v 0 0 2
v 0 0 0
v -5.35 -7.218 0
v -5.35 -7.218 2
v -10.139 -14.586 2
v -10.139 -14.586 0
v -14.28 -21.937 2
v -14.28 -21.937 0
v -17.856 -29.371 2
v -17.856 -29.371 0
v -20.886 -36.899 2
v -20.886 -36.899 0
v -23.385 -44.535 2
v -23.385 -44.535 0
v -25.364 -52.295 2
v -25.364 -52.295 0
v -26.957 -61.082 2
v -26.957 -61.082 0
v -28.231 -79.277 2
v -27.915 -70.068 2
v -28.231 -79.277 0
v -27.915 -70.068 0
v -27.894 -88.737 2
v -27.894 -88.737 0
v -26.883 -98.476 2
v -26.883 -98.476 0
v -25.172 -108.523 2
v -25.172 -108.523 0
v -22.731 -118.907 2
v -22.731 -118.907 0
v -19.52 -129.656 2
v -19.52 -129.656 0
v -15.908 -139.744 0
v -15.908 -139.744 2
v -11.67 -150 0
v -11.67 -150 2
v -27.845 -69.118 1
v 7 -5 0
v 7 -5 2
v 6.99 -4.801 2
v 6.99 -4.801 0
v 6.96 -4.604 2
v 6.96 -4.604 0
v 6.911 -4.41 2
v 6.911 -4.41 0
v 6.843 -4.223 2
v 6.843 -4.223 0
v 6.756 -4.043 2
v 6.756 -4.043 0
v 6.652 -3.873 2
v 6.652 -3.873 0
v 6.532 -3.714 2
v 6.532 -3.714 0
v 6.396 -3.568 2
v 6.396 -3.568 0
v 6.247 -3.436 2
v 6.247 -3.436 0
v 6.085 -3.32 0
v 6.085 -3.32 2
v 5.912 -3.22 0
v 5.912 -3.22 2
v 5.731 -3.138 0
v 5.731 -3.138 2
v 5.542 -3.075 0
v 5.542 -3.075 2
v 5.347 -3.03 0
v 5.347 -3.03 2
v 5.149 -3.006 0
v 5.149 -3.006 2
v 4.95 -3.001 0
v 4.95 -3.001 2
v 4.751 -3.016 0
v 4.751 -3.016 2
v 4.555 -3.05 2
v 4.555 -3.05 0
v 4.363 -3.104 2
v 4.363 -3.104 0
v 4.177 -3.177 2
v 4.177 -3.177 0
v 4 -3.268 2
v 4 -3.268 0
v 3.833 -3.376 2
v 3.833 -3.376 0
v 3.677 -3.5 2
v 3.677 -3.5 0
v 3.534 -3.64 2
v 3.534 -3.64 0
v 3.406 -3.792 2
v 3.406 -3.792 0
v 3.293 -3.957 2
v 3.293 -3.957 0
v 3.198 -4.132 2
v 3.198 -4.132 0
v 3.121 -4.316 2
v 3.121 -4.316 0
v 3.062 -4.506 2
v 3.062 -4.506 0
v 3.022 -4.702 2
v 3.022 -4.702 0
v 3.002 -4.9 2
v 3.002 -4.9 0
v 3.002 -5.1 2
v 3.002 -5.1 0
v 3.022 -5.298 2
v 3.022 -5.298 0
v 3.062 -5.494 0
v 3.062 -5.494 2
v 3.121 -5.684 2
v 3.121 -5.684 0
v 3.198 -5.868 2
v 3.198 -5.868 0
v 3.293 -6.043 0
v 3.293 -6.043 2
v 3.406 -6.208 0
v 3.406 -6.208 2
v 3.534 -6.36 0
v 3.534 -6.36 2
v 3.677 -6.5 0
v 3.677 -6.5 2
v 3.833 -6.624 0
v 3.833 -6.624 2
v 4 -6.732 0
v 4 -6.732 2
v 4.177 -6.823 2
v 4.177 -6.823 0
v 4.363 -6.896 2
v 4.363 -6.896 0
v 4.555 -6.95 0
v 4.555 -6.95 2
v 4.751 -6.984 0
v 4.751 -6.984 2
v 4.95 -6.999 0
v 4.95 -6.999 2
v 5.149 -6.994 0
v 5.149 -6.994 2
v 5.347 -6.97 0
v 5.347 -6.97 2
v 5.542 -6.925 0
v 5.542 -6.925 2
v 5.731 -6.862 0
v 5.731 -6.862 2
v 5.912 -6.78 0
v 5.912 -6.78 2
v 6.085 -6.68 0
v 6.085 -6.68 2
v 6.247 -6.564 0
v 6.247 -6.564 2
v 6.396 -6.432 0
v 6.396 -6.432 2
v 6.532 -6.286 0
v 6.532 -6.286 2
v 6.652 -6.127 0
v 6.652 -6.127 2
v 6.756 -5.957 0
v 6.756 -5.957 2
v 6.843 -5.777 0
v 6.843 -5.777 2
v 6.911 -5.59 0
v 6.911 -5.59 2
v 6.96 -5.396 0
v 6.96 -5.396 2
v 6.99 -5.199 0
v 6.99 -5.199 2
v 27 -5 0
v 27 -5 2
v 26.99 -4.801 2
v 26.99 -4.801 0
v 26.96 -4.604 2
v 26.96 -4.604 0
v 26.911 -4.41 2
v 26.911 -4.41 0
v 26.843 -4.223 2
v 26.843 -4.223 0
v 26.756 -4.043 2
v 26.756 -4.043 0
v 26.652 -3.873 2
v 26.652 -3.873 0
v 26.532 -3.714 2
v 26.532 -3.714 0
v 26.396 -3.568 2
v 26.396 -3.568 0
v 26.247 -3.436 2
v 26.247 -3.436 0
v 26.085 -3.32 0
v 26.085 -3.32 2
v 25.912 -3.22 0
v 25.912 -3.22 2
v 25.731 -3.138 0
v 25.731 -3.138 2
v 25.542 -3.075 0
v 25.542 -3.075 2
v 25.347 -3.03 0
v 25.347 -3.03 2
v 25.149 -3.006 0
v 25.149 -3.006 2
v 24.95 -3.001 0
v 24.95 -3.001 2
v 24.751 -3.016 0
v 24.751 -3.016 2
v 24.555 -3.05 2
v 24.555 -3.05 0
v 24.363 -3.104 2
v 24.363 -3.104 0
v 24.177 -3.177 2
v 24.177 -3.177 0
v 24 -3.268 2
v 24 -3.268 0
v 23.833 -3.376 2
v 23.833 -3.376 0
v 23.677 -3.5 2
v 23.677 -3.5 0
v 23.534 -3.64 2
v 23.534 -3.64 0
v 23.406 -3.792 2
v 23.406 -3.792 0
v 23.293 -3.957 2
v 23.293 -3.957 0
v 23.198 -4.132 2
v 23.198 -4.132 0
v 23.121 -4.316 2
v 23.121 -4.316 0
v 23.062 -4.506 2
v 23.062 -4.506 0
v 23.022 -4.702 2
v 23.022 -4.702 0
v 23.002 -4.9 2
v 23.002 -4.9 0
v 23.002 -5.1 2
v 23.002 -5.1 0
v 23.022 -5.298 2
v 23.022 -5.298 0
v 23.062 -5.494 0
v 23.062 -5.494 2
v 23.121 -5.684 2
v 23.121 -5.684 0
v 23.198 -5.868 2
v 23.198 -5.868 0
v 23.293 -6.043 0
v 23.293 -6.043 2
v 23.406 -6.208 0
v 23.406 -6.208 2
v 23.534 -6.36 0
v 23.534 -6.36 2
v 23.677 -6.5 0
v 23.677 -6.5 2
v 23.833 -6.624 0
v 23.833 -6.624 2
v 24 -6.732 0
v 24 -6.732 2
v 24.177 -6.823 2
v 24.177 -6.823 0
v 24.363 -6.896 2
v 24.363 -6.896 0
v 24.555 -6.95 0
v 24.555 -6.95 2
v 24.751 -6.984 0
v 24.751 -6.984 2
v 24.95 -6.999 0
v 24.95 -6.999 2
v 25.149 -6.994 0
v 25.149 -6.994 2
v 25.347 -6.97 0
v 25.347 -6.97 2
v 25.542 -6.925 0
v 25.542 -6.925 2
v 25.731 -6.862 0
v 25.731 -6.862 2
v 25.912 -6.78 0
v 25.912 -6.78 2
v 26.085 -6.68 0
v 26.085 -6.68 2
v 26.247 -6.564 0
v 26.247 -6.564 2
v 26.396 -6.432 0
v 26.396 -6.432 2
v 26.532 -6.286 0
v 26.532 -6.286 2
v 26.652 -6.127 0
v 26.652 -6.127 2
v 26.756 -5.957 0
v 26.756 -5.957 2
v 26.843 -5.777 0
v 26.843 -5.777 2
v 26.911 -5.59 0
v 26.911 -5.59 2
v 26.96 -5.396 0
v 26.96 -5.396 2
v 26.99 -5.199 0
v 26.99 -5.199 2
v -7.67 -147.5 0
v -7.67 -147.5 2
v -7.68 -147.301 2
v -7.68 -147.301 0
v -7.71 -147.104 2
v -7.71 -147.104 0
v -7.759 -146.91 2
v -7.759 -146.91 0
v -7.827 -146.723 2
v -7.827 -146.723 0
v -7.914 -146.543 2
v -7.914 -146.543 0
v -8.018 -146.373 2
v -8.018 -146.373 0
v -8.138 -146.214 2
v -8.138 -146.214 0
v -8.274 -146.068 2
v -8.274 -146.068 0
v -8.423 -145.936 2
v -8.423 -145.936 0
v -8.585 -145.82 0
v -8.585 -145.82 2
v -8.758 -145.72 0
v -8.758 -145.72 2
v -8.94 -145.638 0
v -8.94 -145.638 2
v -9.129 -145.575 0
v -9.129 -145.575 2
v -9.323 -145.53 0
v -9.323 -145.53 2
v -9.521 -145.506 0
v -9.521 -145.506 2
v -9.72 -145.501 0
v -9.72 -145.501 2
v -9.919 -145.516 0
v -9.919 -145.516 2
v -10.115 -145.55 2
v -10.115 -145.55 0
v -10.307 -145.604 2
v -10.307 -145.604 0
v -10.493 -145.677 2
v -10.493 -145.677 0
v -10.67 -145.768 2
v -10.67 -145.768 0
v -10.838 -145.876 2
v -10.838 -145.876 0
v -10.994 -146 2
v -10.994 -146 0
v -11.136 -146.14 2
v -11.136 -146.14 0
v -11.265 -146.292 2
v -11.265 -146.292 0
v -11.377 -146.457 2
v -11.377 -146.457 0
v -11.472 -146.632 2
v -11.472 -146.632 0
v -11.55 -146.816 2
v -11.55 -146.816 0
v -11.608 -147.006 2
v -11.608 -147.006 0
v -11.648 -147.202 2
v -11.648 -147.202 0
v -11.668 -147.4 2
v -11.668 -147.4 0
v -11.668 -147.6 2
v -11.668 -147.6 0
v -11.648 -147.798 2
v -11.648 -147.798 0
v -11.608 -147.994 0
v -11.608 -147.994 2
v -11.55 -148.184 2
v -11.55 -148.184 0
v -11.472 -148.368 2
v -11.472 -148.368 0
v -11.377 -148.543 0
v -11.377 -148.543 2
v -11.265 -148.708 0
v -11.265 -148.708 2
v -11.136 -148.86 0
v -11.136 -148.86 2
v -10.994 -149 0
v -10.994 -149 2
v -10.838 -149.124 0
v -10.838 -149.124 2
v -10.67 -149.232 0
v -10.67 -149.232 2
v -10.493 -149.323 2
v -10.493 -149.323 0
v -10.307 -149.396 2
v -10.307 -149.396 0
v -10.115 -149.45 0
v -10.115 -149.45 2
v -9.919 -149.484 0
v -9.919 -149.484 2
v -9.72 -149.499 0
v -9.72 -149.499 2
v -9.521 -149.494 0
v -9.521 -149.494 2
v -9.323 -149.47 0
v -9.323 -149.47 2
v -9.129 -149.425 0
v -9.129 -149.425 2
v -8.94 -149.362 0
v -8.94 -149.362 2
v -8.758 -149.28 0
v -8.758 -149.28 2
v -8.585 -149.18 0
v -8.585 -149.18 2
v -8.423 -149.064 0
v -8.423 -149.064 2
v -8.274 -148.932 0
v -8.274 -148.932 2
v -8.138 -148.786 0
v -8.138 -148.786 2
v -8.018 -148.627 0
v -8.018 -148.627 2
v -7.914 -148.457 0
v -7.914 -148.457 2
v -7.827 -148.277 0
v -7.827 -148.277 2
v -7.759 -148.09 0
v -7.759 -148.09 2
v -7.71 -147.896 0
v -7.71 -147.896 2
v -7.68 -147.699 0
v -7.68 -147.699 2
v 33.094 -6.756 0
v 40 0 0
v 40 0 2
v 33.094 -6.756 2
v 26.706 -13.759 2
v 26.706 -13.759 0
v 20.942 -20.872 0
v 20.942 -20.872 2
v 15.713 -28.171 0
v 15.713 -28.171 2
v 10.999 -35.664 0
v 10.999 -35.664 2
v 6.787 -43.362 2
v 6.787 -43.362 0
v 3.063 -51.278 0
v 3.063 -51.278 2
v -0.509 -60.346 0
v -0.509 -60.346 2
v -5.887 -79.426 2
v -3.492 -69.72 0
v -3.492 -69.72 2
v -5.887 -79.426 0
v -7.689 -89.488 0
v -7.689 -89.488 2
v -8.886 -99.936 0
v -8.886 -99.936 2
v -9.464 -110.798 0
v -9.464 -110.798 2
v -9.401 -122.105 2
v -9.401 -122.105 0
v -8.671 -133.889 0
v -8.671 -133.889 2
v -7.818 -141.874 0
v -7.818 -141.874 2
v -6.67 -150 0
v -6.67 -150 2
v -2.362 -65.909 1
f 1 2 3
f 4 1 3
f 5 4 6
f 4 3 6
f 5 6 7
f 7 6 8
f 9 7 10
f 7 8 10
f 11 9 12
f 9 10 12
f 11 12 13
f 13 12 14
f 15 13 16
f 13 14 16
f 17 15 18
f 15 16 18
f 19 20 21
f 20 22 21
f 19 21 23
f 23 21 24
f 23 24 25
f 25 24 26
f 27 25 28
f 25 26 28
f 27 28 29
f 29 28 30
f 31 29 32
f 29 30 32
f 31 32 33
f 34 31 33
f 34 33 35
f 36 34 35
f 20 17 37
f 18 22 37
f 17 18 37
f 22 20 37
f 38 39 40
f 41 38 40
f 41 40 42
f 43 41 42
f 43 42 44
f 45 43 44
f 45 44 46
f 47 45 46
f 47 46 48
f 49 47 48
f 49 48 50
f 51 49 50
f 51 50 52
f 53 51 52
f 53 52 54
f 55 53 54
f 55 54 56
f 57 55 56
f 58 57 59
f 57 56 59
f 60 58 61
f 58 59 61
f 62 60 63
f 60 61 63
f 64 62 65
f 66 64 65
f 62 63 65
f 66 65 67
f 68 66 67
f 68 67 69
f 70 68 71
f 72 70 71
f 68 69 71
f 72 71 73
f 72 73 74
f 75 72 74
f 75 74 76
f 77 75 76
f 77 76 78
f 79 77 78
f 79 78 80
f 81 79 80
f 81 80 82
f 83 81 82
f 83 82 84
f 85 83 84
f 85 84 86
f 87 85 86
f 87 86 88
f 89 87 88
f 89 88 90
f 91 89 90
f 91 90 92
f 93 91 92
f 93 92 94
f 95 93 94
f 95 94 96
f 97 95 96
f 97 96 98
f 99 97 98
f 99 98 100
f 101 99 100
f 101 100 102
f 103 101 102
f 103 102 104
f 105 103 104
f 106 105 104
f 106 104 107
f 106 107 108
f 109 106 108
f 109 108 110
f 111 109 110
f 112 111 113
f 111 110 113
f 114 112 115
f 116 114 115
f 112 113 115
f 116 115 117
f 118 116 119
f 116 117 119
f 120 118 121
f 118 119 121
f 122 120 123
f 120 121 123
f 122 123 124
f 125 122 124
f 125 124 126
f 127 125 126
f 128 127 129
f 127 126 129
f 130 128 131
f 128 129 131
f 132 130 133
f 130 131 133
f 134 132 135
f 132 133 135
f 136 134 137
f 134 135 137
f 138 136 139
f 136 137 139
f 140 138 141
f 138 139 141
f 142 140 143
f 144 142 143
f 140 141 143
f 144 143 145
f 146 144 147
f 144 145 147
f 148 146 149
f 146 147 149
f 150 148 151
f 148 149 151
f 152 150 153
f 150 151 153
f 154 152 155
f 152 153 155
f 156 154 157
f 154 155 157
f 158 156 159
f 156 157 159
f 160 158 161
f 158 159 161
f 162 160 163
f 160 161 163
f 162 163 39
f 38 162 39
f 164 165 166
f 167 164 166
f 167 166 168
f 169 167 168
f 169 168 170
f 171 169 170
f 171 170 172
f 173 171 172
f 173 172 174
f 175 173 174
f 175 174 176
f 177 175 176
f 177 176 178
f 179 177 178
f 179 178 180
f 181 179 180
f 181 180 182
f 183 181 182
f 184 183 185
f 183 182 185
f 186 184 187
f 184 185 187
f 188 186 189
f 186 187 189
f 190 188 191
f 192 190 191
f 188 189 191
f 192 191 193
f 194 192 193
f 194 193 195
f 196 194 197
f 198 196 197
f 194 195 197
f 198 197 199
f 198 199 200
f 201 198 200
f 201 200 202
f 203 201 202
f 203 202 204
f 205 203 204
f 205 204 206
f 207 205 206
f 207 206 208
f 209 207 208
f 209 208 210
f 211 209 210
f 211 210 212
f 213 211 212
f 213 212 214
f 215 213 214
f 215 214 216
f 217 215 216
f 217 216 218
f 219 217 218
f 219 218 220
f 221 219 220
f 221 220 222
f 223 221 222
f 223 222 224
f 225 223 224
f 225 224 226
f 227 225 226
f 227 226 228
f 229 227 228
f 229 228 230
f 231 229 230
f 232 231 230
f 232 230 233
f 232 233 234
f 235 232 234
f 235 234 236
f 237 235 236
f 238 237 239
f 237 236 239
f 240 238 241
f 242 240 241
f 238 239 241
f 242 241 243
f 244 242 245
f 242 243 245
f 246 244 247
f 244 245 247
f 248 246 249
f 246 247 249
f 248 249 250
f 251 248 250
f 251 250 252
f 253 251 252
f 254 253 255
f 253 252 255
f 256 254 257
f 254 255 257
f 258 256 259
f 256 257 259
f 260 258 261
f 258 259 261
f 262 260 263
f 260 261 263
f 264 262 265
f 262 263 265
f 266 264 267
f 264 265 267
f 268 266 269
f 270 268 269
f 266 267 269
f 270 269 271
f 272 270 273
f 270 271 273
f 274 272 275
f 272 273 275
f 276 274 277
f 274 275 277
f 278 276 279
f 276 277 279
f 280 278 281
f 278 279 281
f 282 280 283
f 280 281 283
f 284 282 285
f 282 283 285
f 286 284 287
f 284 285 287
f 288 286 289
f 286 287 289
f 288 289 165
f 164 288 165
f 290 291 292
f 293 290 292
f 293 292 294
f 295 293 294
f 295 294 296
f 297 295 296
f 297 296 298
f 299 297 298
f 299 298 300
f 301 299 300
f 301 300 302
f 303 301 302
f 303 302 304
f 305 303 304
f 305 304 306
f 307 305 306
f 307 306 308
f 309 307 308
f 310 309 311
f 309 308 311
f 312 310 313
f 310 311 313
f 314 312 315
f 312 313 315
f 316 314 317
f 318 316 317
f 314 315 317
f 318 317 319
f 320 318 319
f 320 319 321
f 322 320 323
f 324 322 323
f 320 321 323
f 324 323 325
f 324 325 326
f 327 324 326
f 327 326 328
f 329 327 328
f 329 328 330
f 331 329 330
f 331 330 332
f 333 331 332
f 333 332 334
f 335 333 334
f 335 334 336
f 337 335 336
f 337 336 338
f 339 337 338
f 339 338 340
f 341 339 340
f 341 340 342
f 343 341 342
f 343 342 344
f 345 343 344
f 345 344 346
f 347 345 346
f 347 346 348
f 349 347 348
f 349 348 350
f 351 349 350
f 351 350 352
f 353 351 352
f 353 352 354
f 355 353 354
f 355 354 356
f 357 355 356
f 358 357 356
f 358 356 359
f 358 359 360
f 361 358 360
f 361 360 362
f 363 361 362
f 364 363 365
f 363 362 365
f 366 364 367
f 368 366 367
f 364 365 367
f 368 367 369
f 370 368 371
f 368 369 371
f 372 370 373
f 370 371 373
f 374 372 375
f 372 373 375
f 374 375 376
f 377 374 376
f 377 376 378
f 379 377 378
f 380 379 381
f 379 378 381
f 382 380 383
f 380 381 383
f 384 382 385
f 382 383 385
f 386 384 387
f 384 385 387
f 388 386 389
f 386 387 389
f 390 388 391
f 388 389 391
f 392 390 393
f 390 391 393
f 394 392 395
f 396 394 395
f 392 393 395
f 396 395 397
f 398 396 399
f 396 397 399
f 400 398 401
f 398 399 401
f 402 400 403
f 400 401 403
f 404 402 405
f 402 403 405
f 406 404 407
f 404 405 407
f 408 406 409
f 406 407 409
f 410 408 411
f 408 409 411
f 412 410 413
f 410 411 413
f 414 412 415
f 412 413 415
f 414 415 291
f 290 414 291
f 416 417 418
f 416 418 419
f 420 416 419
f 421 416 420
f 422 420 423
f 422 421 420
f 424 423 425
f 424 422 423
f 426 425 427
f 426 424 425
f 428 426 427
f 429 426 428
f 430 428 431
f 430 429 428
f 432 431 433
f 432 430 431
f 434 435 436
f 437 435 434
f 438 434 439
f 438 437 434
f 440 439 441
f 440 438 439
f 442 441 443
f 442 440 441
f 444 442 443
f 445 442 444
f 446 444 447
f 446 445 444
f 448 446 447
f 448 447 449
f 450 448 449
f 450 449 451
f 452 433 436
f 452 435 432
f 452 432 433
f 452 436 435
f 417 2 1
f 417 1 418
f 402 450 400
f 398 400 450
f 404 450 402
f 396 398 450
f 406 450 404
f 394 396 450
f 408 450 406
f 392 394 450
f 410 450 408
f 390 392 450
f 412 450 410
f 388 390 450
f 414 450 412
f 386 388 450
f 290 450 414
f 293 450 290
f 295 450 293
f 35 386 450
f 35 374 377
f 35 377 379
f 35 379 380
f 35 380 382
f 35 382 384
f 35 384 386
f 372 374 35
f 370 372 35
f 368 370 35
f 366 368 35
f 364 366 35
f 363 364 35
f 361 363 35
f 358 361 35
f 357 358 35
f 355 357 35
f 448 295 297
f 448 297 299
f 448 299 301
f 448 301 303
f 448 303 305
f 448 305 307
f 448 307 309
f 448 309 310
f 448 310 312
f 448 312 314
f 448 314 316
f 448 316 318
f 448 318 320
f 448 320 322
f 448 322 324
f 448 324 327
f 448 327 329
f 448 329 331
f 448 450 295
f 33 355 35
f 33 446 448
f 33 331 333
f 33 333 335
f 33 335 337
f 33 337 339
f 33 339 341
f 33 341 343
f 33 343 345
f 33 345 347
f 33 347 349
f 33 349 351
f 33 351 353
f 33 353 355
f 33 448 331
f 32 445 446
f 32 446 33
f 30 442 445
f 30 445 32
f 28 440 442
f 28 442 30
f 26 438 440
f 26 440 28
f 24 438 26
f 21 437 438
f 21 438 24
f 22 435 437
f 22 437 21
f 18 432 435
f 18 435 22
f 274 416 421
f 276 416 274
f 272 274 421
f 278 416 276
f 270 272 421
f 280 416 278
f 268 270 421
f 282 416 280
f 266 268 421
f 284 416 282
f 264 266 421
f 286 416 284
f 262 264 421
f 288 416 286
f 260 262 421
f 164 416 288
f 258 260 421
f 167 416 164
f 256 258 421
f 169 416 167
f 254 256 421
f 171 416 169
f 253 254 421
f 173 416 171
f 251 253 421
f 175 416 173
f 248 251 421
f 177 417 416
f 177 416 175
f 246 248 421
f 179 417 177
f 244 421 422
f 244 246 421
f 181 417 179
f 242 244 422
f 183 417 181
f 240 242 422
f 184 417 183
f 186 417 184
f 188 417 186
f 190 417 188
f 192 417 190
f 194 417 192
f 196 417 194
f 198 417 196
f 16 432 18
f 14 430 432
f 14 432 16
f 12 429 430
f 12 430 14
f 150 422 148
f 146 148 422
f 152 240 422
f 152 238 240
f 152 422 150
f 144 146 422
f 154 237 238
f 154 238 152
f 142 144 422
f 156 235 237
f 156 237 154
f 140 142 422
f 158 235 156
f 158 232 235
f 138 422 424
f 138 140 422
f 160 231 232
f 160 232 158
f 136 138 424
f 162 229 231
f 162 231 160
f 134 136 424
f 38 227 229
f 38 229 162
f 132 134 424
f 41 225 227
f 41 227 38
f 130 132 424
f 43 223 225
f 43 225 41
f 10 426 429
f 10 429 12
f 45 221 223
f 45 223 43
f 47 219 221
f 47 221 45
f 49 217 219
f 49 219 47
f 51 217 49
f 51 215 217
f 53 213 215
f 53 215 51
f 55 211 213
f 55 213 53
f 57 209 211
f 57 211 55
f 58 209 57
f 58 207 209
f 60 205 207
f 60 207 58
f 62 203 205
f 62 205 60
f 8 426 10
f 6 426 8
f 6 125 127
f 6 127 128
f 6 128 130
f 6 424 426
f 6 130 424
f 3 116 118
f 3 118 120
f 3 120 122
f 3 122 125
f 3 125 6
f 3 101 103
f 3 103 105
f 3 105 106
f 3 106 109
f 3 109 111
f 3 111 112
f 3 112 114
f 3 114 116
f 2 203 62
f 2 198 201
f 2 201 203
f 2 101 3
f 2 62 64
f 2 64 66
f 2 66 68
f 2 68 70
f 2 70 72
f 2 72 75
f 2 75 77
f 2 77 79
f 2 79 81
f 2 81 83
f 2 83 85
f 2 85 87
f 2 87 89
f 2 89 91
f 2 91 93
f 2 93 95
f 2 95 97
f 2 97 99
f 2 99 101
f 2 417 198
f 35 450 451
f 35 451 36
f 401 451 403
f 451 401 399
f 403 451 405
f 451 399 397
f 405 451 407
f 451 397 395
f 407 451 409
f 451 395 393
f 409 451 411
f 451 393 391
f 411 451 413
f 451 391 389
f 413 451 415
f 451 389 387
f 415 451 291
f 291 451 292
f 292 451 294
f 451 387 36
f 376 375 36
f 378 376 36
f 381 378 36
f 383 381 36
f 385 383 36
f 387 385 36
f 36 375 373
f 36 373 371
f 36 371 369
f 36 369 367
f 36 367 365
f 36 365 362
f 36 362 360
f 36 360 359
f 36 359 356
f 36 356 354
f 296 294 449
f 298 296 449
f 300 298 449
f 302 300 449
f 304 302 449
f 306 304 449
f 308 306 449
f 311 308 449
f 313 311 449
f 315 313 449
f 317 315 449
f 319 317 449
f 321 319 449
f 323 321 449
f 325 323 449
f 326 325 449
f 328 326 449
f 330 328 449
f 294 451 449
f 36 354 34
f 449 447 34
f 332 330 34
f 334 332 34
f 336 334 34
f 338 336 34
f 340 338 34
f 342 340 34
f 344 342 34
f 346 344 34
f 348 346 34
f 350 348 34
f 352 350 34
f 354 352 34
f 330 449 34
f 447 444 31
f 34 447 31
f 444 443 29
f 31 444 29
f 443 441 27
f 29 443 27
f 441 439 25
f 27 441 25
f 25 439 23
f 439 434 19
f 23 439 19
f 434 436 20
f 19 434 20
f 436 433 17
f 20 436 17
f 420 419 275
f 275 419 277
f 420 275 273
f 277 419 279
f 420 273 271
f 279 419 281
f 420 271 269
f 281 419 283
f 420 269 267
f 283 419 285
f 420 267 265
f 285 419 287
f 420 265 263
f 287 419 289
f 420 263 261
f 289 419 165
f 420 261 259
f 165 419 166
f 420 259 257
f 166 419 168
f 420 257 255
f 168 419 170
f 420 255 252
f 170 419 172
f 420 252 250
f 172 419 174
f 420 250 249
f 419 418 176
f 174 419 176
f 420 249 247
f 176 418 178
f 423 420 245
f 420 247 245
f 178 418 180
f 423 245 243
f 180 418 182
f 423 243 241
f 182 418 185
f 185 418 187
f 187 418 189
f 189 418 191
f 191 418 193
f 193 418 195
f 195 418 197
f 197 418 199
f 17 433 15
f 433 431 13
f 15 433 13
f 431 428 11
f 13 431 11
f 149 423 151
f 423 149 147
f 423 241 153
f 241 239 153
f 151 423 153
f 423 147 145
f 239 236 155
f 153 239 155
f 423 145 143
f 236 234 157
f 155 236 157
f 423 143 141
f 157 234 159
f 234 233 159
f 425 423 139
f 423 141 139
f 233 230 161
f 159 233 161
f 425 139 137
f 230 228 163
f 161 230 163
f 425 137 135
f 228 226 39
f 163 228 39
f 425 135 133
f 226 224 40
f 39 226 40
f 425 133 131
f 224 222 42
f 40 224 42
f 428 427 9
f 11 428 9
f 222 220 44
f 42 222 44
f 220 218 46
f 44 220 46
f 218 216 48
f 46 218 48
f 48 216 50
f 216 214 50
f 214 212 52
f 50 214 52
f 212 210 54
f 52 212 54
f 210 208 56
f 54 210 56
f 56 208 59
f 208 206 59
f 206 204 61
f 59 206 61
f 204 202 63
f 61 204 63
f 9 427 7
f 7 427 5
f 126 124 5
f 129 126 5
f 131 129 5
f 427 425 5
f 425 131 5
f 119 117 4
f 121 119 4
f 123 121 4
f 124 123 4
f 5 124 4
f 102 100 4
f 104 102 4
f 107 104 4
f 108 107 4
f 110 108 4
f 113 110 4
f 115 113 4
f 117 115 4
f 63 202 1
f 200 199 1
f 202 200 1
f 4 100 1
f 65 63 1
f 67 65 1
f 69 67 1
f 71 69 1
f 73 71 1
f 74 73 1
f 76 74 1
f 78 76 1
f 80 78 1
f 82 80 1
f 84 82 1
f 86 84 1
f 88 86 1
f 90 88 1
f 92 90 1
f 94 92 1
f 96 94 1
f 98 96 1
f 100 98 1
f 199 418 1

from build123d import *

# Parameters (mm, degrees)
EXTRUDE_1_DEPTH     = 2
SKETCH_2_R          = 2
CUT_EXTRUDE_1_DEPTH = 3.0000001


with BuildPart() as part:
    # Эскиз1 → Бобышка-Вытянуть1 (new body)
    with BuildSketch(Plane.XY):
        with BuildLine():
            Line((0, 0), (40, 0))
            add(Edge.make_bspline(
                [(40, 0), (-21.389317784, -56.818064534), (-6.67027027, -150)],
                knots=[0, 0, 0, 1, 1, 1], degree=2))
            Line((-6.67027027, -150), (-11.67027027, -150))
            add(Edge.make_bspline(
                [(0, 0), (-49.854113681, -63.235965622), (-11.67027027, -150)],
                knots=[0, 0, 0, 1, 1, 1], degree=2))
        make_face()
    extrude(amount=EXTRUDE_1_DEPTH)

    # Эскиз2 → Вырез-Вытянуть1 (cut, through all)
    with BuildSketch(Plane.XY.offset(2)):
        with Locations((5, -5)):
            Circle(SKETCH_2_R)
        with Locations((25, -5)):
            Circle(SKETCH_2_R)
        with Locations((-9.67027027, -147.5)):
            Circle(SKETCH_2_R)
    extrude(amount=-CUT_EXTRUDE_1_DEPTH, mode=Mode.SUBTRACT)


solid = part.part
